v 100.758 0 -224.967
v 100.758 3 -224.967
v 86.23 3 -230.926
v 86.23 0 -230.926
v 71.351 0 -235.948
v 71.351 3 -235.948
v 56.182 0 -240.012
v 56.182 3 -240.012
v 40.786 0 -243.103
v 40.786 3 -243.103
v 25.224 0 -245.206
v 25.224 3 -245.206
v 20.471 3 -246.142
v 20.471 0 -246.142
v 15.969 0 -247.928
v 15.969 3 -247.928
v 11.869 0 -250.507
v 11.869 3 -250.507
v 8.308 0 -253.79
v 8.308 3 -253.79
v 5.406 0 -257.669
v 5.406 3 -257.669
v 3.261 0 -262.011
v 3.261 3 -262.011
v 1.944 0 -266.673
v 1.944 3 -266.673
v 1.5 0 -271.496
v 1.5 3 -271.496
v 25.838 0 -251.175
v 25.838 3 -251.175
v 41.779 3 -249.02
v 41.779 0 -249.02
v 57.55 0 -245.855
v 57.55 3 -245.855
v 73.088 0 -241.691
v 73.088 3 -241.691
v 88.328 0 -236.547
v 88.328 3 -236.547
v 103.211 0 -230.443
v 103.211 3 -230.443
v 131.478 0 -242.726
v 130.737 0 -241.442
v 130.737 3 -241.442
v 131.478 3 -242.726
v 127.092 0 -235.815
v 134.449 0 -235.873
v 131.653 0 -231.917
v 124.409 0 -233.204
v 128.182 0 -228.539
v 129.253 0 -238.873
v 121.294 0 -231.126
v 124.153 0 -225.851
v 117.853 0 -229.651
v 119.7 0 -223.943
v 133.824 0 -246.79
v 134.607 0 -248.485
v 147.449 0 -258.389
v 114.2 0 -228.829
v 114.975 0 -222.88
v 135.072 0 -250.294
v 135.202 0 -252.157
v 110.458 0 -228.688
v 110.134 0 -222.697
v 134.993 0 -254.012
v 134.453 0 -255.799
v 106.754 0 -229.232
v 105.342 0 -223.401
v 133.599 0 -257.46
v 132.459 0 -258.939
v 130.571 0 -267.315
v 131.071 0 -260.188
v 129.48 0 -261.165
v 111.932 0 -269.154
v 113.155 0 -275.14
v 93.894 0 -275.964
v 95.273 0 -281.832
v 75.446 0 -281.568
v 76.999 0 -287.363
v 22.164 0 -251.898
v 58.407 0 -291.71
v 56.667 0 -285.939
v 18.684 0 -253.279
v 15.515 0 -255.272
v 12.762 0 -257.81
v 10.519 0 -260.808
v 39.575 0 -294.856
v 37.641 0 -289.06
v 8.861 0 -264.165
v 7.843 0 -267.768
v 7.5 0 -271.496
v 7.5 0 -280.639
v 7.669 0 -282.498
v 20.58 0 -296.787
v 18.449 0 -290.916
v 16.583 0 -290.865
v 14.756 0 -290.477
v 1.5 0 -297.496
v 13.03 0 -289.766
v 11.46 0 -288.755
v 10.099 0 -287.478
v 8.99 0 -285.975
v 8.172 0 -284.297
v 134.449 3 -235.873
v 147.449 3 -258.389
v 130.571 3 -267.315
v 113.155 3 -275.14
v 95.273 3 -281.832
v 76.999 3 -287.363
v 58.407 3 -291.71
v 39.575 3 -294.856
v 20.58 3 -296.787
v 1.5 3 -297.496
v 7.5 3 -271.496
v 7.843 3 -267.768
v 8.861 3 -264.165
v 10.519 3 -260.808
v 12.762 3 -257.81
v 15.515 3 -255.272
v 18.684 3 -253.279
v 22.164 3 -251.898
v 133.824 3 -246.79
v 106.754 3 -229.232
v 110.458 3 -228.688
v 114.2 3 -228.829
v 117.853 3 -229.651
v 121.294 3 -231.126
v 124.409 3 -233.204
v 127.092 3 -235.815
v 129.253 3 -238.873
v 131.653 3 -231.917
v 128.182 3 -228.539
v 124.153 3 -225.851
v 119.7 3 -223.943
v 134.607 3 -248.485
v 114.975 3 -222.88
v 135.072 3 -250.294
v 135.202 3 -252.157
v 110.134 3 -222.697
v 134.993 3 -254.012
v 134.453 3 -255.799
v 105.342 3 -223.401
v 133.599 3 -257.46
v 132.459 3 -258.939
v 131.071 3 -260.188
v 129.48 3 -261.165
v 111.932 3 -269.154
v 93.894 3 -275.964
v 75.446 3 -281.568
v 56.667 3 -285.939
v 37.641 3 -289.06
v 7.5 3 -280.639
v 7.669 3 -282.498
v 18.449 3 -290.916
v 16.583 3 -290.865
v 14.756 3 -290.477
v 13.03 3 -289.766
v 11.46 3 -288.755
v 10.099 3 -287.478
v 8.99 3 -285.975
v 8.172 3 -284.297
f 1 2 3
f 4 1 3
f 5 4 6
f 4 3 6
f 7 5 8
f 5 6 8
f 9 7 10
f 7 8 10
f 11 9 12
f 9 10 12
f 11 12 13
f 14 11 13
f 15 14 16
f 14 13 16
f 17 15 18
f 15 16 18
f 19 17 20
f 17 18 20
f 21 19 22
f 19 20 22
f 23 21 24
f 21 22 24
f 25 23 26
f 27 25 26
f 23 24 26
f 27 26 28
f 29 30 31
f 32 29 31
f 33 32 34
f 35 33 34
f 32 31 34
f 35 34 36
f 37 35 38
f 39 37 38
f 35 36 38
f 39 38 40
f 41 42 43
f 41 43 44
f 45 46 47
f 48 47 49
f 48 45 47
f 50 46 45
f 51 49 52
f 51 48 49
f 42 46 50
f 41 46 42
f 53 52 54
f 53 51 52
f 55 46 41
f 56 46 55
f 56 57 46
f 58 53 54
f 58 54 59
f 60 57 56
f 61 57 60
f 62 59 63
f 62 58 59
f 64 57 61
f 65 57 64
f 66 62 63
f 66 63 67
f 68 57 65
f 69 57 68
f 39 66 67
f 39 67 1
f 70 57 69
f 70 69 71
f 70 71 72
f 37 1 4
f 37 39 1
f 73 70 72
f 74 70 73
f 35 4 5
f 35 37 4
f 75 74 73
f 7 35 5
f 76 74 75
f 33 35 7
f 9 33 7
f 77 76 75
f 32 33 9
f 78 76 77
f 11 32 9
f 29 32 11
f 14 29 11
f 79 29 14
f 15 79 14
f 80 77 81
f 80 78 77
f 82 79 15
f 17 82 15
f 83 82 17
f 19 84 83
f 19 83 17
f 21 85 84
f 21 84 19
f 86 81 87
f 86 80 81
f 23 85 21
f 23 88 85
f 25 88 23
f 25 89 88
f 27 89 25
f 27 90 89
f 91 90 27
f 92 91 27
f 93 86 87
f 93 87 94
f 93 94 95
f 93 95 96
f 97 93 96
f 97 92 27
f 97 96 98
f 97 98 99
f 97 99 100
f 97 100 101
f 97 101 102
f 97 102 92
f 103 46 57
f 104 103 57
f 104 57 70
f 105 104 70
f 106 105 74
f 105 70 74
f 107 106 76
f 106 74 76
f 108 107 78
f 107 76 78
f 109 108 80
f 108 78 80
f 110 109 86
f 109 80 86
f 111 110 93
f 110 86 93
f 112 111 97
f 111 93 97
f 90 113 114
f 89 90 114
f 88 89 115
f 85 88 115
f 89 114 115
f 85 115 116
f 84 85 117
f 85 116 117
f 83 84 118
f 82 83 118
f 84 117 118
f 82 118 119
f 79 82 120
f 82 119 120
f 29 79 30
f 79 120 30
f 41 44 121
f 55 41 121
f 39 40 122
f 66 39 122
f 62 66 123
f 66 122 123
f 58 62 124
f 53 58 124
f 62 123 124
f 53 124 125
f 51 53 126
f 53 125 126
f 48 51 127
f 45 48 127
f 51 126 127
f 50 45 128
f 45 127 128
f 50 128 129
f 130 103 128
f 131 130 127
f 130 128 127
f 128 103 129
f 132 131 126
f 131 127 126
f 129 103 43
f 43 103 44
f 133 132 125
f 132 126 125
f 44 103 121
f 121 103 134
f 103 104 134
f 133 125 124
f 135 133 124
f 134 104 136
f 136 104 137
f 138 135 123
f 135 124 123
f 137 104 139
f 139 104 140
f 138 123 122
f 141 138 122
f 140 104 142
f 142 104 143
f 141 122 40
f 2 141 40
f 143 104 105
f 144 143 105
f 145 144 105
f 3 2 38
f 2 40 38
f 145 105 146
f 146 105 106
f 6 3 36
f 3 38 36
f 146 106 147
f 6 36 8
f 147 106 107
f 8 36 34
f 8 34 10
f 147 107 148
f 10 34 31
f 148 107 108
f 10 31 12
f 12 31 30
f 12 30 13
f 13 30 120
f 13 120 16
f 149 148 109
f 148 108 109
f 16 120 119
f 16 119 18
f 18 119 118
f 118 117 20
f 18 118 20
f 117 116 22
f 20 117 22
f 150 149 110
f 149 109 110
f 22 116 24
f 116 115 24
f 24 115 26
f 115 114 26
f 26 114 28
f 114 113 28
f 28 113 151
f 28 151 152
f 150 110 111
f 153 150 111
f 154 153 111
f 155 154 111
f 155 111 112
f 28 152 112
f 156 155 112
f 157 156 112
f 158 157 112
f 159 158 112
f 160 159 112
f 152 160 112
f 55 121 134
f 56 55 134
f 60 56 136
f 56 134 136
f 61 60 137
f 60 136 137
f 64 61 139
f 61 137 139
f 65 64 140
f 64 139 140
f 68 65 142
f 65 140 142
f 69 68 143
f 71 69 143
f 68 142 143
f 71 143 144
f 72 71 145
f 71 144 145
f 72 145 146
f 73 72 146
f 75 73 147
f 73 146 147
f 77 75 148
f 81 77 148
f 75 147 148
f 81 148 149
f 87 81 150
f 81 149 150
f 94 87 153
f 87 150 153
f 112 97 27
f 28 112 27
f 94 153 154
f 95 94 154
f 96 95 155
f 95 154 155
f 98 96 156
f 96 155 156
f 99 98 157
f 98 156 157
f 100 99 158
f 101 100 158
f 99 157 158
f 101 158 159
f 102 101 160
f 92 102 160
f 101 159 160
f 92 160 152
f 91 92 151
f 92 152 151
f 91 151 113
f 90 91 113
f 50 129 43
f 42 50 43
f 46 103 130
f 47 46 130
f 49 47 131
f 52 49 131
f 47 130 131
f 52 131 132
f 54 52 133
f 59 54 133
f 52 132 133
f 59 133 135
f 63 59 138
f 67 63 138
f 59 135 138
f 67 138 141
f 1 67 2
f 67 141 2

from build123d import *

# Parameters (mm, degrees)
BOSS_EXTRUDE1_DEPTH = 3
CUT_EXTRUDE1_DEPTH  = 3
FILLET1_R           = 10
FILLET2_R           = 3
BOSS_EXTRUDE2_DEPTH = 3
CUT_EXTRUDE2_DEPTH  = 3


with BuildPart() as part:
    # Sketch1 → Boss-Extrude1 (new body)
    with BuildSketch(Plane(origin=(0, 0, 0), x_dir=(1, 0, 0), z_dir=(0, 1, 0))):
        with BuildLine():
            Line((1.5, 297.496218463), (1.5, 271.496218463))
            ThreePointArc((1.5, 271.496218463), (70.269464473, 262.249211634), (134.449071126, 235.872622221))
            Line((134.449071126, 235.872622221), (147.449071126, 258.389282719))
            ThreePointArc((147.449071126, 258.389282719), (76.998665918, 287.362933321), (1.5, 297.496218463))
        make_face()
    extrude(amount=BOSS_EXTRUDE1_DEPTH)

    # Sketch3 → Cut-Extrude1 (cut)
    with BuildSketch(Plane(origin=(0, 3, 0), x_dir=(1, 0, 0), z_dir=(0, 1, 0))):
        with BuildLine():
            Line((7.5, 271.396751344), (129.203185143, 238.786481168))
            Line((129.203185143, 238.786481168), (136.70589842, 251.781561758))
            ThreePointArc((136.70589842, 251.781561758), (74.15175015, 276.738099028), (7.5, 286.402177897))
            Line((7.5, 286.402177897), (7.5, 271.396751344))
        make_face()
    extrude(amount=-CUT_EXTRUDE1_DEPTH, mode=Mode.SUBTRACT)

    # Fillet1
    fillet1_edges = [part.edges().sort_by_distance(p)[0] for p in [
        (7.5, 1.5, -286.402177897),
        (136.70589842, 1.5, -251.781561758),
    ]]
    fillet(fillet1_edges, radius=FILLET1_R)

    # Fillet2
    fillet2_edges = [part.edges().sort_by_distance(p)[0] for p in [
        (7.5, 1.5, -271.396751344),
        (129.203185143, 1.5, -238.786481168),
    ]]
    fillet(fillet2_edges, radius=FILLET2_R)

    # Sketch4 → Boss-Extrude2 (add)
    with BuildSketch(Plane(origin=(0, 3, 0), x_dir=(1, 0, 0), z_dir=(0, 1, 0))):
        with BuildLine():
            Line((129.252918703, 238.872622221), (130.736546702, 241.442341293))
            Line((130.736546702, 241.442341293), (134.449071126, 235.872622221))
            ThreePointArc((134.449071126, 235.872622221), (119.700341049, 223.942829747), (100.758430139, 224.967036005))
            ThreePointArc((100.758430139, 224.967036005), (63.798988345, 238.101065977), (25.224157857, 245.206383264))
            ThreePointArc((25.224157857, 245.206383264), (8.307878683, 253.79035008), (1.5, 271.496218463))
            Line((1.5, 271.496218463), (7.5, 274.46347446))
            Line((7.5, 274.46347446), (7.5, 271.496218463))
            ThreePointArc((7.5, 271.496218463), (12.762306102, 257.810061061), (25.838132399, 251.174886867))
            ThreePointArc((25.838132399, 251.174886867), (65.351902616, 243.896620934), (103.21096439, 230.44289902))
            ThreePointArc((103.21096439, 230.44289902), (117.852549236, 229.651215281), (129.252918703, 238.872622221))
        make_face()
    extrude(amount=-BOSS_EXTRUDE2_DEPTH)

    # Sketch5 → Cut-Extrude2 (cut)
    with BuildSketch(Plane(origin=(0, 3, 0), x_dir=(1, 0, 0), z_dir=(0, 1, 0))):
        with BuildLine():
            Line((131.477814314, 242.72625446), (133.824291098, 246.790471469))
            ThreePointArc((133.824291098, 246.790471469), (134.763656185, 254.918092038), (129.480348672, 261.165274172))
            ThreePointArc((129.480348672, 261.165274172), (75.445845375, 281.56772816), (18.449365845, 290.915936355))
            ThreePointArc((18.449365845, 290.915936355), (10.750296256, 288.147371682), (7.5, 280.638963253))
            Line((7.5, 280.638963253), (7.5, 275.946009685))
            Line((7.5, 275.946009685), (131.477814314, 242.72625446))
        make_face()
    extrude(amount=-CUT_EXTRUDE2_DEPTH, mode=Mode.SUBTRACT)


solid = part.part
